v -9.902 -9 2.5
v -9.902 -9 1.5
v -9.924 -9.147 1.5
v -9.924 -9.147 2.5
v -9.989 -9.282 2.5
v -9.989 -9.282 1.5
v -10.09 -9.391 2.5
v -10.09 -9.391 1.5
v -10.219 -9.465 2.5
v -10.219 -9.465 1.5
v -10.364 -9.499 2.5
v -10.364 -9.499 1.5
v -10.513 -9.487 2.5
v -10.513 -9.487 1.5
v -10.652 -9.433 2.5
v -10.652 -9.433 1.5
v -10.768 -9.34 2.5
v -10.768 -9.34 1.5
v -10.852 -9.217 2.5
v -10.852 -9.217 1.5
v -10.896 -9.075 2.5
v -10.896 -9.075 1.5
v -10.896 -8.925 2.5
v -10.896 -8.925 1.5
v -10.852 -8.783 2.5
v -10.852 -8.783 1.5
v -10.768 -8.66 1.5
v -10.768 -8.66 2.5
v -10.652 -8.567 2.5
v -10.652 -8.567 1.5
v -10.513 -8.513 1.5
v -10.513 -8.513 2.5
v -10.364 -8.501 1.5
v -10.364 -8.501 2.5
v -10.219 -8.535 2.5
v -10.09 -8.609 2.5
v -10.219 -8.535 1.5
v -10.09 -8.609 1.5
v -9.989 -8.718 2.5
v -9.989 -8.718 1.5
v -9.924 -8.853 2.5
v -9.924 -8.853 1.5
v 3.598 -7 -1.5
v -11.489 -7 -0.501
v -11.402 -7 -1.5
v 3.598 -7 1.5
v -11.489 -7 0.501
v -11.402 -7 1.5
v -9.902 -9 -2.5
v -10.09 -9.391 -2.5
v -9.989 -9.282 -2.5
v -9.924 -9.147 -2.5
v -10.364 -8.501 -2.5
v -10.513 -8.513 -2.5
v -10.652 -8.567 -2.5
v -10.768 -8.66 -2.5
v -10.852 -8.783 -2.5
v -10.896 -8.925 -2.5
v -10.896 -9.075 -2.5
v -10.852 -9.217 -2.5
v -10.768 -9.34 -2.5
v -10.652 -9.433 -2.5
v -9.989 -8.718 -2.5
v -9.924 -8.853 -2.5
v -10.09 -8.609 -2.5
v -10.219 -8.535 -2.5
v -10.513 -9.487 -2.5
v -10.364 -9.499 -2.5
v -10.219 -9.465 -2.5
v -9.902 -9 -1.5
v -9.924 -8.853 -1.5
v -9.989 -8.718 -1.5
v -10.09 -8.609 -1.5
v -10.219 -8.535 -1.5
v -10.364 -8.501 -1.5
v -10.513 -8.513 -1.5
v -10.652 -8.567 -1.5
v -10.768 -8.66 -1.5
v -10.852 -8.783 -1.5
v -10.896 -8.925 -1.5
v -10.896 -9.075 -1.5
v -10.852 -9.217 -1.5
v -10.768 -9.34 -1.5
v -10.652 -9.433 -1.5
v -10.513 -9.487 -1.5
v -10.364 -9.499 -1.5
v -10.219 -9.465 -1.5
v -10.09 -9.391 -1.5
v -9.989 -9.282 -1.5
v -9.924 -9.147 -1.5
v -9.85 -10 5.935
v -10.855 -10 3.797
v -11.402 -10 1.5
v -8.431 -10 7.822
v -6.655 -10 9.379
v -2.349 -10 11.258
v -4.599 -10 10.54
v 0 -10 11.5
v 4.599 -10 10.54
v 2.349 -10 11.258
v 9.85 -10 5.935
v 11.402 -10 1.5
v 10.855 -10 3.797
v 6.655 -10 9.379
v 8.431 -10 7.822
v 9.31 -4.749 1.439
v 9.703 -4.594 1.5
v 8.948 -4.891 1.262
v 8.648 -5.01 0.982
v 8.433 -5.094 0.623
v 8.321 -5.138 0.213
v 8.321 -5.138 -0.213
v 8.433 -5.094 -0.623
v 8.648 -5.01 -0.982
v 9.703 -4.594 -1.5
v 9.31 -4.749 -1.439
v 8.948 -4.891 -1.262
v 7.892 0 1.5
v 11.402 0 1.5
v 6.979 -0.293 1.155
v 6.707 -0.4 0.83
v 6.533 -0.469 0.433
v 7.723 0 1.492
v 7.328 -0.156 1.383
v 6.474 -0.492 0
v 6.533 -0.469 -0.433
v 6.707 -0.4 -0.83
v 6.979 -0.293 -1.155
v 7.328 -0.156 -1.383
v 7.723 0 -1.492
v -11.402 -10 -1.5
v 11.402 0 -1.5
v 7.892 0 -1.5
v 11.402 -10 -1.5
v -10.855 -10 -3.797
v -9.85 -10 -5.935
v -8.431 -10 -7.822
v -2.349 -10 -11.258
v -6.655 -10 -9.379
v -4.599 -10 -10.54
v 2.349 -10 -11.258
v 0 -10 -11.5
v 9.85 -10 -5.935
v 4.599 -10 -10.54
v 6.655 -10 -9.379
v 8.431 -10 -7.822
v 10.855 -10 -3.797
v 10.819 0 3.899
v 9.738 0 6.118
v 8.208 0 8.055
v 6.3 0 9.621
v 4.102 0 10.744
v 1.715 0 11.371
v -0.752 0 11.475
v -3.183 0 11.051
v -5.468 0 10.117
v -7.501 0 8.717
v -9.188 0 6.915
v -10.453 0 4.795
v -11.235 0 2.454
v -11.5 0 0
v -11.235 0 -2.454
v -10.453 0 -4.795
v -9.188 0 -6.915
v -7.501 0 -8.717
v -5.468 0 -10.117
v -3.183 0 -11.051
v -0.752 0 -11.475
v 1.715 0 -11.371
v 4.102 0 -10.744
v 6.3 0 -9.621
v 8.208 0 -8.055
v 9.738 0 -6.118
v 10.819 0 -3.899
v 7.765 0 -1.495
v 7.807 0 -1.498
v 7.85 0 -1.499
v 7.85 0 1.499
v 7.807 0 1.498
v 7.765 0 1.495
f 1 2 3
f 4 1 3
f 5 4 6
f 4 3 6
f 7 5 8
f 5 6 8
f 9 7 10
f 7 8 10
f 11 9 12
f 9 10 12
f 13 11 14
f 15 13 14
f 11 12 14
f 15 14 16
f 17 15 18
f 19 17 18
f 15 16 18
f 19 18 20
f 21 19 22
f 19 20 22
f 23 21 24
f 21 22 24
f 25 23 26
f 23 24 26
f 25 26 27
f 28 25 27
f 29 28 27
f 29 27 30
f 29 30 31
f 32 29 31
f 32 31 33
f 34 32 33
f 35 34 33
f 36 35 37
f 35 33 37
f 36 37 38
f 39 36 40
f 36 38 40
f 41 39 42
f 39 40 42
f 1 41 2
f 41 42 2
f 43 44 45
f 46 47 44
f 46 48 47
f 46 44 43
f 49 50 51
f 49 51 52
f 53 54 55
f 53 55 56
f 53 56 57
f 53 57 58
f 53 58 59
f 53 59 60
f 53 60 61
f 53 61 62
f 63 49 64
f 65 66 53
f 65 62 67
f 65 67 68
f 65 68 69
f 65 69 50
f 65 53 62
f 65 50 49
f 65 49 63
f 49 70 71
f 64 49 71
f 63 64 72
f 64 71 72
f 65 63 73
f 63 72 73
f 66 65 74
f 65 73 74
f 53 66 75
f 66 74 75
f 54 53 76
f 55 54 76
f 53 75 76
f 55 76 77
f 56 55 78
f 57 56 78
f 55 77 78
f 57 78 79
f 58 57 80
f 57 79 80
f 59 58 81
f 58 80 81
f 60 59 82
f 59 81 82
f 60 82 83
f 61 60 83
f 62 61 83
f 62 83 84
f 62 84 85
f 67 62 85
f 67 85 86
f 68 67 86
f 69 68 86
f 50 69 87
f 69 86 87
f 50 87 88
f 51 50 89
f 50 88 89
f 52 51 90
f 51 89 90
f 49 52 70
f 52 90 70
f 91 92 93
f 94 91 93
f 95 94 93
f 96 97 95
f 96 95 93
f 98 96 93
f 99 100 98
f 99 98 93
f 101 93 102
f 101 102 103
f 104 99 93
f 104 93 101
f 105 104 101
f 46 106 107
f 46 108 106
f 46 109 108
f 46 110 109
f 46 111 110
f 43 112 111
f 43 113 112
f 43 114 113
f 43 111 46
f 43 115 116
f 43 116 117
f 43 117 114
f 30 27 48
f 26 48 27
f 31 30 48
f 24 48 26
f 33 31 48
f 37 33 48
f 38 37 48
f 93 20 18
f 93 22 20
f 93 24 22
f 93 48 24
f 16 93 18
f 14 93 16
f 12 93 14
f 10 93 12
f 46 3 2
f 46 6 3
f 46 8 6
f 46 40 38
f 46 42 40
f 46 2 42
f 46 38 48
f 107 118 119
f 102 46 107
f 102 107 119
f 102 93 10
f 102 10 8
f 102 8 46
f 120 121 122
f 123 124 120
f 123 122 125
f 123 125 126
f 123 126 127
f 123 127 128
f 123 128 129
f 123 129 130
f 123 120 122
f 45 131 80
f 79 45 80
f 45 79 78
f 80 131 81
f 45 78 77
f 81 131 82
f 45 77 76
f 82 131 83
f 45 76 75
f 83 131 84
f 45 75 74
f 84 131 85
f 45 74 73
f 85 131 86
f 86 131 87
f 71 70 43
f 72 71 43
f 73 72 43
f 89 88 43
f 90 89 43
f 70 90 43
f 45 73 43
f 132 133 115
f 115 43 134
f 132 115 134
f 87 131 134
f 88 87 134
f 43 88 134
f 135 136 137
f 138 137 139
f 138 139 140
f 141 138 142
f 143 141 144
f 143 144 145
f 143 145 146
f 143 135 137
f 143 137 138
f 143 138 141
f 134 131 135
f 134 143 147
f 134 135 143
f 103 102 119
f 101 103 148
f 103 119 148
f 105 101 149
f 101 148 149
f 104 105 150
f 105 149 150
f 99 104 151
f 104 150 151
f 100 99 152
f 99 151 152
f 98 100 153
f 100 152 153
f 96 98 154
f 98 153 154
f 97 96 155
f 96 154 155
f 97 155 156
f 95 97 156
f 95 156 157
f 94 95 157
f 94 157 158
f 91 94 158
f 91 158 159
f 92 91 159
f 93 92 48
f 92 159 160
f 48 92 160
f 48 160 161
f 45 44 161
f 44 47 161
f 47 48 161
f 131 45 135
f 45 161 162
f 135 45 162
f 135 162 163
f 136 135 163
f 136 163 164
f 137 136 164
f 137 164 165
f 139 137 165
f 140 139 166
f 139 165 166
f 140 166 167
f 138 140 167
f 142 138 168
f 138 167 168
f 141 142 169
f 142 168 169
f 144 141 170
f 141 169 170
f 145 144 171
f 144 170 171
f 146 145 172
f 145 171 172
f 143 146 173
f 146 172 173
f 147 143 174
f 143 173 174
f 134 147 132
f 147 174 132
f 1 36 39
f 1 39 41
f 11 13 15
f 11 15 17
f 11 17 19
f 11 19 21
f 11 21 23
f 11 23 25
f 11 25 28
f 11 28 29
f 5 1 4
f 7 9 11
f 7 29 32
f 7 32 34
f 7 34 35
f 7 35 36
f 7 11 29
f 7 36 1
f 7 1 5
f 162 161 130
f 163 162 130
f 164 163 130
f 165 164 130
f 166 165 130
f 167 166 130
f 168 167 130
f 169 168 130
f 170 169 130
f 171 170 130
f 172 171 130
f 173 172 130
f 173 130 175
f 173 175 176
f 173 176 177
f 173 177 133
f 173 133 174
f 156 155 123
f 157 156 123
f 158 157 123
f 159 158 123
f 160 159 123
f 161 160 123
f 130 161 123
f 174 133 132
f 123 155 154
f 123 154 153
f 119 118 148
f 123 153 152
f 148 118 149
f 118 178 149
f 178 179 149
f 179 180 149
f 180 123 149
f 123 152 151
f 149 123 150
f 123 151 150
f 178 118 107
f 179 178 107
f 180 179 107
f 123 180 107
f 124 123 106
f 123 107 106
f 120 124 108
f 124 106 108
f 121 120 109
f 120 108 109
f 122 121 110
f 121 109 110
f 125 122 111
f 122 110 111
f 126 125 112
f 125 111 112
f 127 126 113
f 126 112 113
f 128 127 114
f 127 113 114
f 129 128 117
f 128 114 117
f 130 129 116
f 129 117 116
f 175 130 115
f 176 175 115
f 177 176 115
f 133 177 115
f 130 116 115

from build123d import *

# Parameters (mm, degrees)
F0_R      = 11.5
F1_DEPTH  = 10
F2_W      = 30.00446
F2_H      = 3
F3_DEPTH  = 3
F4_R      = 0.5
F5_DEPTH  = 1
F6_R      = 0.5
F7_DEPTH  = 1
F9_DEPTH  = 3
F11_DEPTH = 5


with BuildPart() as f1:
    # F0 (on Front) → F1 (new body)
    with BuildSketch(Plane.XZ):
        Circle(F0_R)
    extrude(amount=F1_DEPTH)

    # F2 (on face) → F3 (cut)
    with BuildSketch(Plane.XZ.offset(10)):
        Rectangle(F2_W, F2_H)
    extrude(amount=-F3_DEPTH, mode=Mode.SUBTRACT)

    # F4 (on face) → F5 (cut)
    with BuildSketch(Plane(origin=(0, 0, 1.5), x_dir=(1, 0, 0), z_dir=(0, 0, -1))):
        with Locations((-10.401754, 9)):
            Circle(F4_R)
    extrude(amount=-F5_DEPTH, mode=Mode.SUBTRACT)

    # F6 (on face) → F7 (cut)
    with BuildSketch(Plane.XY.offset(-1.5)):
        with Locations((-10.401754, -9)):
            Circle(F6_R)
    extrude(amount=-F7_DEPTH, mode=Mode.SUBTRACT)

    # F8 (on face) → F9 (cut)
    with BuildSketch(Plane.XY.offset(-1.5)):
        Polygon((13.954913, -2.917858), (3.598246, -7), (11.401754, -7), align=None)
        Polygon((14.351814, -7.2972), (13.954913, -2.917858), (11.401754, -7), align=None)
    extrude(amount=F9_DEPTH, mode=Mode.SUBTRACT)

    # F10 (on face) → F11 (cut)
    with BuildSketch(Plane(origin=(2.871931, -7.286281, 0), x_dir=(0.93034, 0.366699, 0), z_dir=(0.366699, -0.93034, 0))):
        with BuildLine():
            ThreePointArc((7.342269, -1.5), (8.402929, -1.06066), (8.842269, 0))
            ThreePointArc((8.842269, 0), (8.402929, 1.06066), (7.342269, 1.5))
            ThreePointArc((7.342269, 1.5), (5.842269, 0), (7.342269, -1.5))
        make_face()
        with BuildLine():
            ThreePointArc((7.342269, 1.5), (8.402929, 1.06066), (8.842269, 0))
            ThreePointArc((8.842269, 0), (8.402929, -1.06066), (7.342269, -1.5))
            Line((7.342269, -1.5), (11.188243, -1.5))
            Line((11.188243, -1.5), (11.188243, 1.5))
            Line((11.188243, 1.5), (7.342269, 1.5))
        make_face()
    extrude(amount=-F11_DEPTH, mode=Mode.SUBTRACT)


solid = f1.part
